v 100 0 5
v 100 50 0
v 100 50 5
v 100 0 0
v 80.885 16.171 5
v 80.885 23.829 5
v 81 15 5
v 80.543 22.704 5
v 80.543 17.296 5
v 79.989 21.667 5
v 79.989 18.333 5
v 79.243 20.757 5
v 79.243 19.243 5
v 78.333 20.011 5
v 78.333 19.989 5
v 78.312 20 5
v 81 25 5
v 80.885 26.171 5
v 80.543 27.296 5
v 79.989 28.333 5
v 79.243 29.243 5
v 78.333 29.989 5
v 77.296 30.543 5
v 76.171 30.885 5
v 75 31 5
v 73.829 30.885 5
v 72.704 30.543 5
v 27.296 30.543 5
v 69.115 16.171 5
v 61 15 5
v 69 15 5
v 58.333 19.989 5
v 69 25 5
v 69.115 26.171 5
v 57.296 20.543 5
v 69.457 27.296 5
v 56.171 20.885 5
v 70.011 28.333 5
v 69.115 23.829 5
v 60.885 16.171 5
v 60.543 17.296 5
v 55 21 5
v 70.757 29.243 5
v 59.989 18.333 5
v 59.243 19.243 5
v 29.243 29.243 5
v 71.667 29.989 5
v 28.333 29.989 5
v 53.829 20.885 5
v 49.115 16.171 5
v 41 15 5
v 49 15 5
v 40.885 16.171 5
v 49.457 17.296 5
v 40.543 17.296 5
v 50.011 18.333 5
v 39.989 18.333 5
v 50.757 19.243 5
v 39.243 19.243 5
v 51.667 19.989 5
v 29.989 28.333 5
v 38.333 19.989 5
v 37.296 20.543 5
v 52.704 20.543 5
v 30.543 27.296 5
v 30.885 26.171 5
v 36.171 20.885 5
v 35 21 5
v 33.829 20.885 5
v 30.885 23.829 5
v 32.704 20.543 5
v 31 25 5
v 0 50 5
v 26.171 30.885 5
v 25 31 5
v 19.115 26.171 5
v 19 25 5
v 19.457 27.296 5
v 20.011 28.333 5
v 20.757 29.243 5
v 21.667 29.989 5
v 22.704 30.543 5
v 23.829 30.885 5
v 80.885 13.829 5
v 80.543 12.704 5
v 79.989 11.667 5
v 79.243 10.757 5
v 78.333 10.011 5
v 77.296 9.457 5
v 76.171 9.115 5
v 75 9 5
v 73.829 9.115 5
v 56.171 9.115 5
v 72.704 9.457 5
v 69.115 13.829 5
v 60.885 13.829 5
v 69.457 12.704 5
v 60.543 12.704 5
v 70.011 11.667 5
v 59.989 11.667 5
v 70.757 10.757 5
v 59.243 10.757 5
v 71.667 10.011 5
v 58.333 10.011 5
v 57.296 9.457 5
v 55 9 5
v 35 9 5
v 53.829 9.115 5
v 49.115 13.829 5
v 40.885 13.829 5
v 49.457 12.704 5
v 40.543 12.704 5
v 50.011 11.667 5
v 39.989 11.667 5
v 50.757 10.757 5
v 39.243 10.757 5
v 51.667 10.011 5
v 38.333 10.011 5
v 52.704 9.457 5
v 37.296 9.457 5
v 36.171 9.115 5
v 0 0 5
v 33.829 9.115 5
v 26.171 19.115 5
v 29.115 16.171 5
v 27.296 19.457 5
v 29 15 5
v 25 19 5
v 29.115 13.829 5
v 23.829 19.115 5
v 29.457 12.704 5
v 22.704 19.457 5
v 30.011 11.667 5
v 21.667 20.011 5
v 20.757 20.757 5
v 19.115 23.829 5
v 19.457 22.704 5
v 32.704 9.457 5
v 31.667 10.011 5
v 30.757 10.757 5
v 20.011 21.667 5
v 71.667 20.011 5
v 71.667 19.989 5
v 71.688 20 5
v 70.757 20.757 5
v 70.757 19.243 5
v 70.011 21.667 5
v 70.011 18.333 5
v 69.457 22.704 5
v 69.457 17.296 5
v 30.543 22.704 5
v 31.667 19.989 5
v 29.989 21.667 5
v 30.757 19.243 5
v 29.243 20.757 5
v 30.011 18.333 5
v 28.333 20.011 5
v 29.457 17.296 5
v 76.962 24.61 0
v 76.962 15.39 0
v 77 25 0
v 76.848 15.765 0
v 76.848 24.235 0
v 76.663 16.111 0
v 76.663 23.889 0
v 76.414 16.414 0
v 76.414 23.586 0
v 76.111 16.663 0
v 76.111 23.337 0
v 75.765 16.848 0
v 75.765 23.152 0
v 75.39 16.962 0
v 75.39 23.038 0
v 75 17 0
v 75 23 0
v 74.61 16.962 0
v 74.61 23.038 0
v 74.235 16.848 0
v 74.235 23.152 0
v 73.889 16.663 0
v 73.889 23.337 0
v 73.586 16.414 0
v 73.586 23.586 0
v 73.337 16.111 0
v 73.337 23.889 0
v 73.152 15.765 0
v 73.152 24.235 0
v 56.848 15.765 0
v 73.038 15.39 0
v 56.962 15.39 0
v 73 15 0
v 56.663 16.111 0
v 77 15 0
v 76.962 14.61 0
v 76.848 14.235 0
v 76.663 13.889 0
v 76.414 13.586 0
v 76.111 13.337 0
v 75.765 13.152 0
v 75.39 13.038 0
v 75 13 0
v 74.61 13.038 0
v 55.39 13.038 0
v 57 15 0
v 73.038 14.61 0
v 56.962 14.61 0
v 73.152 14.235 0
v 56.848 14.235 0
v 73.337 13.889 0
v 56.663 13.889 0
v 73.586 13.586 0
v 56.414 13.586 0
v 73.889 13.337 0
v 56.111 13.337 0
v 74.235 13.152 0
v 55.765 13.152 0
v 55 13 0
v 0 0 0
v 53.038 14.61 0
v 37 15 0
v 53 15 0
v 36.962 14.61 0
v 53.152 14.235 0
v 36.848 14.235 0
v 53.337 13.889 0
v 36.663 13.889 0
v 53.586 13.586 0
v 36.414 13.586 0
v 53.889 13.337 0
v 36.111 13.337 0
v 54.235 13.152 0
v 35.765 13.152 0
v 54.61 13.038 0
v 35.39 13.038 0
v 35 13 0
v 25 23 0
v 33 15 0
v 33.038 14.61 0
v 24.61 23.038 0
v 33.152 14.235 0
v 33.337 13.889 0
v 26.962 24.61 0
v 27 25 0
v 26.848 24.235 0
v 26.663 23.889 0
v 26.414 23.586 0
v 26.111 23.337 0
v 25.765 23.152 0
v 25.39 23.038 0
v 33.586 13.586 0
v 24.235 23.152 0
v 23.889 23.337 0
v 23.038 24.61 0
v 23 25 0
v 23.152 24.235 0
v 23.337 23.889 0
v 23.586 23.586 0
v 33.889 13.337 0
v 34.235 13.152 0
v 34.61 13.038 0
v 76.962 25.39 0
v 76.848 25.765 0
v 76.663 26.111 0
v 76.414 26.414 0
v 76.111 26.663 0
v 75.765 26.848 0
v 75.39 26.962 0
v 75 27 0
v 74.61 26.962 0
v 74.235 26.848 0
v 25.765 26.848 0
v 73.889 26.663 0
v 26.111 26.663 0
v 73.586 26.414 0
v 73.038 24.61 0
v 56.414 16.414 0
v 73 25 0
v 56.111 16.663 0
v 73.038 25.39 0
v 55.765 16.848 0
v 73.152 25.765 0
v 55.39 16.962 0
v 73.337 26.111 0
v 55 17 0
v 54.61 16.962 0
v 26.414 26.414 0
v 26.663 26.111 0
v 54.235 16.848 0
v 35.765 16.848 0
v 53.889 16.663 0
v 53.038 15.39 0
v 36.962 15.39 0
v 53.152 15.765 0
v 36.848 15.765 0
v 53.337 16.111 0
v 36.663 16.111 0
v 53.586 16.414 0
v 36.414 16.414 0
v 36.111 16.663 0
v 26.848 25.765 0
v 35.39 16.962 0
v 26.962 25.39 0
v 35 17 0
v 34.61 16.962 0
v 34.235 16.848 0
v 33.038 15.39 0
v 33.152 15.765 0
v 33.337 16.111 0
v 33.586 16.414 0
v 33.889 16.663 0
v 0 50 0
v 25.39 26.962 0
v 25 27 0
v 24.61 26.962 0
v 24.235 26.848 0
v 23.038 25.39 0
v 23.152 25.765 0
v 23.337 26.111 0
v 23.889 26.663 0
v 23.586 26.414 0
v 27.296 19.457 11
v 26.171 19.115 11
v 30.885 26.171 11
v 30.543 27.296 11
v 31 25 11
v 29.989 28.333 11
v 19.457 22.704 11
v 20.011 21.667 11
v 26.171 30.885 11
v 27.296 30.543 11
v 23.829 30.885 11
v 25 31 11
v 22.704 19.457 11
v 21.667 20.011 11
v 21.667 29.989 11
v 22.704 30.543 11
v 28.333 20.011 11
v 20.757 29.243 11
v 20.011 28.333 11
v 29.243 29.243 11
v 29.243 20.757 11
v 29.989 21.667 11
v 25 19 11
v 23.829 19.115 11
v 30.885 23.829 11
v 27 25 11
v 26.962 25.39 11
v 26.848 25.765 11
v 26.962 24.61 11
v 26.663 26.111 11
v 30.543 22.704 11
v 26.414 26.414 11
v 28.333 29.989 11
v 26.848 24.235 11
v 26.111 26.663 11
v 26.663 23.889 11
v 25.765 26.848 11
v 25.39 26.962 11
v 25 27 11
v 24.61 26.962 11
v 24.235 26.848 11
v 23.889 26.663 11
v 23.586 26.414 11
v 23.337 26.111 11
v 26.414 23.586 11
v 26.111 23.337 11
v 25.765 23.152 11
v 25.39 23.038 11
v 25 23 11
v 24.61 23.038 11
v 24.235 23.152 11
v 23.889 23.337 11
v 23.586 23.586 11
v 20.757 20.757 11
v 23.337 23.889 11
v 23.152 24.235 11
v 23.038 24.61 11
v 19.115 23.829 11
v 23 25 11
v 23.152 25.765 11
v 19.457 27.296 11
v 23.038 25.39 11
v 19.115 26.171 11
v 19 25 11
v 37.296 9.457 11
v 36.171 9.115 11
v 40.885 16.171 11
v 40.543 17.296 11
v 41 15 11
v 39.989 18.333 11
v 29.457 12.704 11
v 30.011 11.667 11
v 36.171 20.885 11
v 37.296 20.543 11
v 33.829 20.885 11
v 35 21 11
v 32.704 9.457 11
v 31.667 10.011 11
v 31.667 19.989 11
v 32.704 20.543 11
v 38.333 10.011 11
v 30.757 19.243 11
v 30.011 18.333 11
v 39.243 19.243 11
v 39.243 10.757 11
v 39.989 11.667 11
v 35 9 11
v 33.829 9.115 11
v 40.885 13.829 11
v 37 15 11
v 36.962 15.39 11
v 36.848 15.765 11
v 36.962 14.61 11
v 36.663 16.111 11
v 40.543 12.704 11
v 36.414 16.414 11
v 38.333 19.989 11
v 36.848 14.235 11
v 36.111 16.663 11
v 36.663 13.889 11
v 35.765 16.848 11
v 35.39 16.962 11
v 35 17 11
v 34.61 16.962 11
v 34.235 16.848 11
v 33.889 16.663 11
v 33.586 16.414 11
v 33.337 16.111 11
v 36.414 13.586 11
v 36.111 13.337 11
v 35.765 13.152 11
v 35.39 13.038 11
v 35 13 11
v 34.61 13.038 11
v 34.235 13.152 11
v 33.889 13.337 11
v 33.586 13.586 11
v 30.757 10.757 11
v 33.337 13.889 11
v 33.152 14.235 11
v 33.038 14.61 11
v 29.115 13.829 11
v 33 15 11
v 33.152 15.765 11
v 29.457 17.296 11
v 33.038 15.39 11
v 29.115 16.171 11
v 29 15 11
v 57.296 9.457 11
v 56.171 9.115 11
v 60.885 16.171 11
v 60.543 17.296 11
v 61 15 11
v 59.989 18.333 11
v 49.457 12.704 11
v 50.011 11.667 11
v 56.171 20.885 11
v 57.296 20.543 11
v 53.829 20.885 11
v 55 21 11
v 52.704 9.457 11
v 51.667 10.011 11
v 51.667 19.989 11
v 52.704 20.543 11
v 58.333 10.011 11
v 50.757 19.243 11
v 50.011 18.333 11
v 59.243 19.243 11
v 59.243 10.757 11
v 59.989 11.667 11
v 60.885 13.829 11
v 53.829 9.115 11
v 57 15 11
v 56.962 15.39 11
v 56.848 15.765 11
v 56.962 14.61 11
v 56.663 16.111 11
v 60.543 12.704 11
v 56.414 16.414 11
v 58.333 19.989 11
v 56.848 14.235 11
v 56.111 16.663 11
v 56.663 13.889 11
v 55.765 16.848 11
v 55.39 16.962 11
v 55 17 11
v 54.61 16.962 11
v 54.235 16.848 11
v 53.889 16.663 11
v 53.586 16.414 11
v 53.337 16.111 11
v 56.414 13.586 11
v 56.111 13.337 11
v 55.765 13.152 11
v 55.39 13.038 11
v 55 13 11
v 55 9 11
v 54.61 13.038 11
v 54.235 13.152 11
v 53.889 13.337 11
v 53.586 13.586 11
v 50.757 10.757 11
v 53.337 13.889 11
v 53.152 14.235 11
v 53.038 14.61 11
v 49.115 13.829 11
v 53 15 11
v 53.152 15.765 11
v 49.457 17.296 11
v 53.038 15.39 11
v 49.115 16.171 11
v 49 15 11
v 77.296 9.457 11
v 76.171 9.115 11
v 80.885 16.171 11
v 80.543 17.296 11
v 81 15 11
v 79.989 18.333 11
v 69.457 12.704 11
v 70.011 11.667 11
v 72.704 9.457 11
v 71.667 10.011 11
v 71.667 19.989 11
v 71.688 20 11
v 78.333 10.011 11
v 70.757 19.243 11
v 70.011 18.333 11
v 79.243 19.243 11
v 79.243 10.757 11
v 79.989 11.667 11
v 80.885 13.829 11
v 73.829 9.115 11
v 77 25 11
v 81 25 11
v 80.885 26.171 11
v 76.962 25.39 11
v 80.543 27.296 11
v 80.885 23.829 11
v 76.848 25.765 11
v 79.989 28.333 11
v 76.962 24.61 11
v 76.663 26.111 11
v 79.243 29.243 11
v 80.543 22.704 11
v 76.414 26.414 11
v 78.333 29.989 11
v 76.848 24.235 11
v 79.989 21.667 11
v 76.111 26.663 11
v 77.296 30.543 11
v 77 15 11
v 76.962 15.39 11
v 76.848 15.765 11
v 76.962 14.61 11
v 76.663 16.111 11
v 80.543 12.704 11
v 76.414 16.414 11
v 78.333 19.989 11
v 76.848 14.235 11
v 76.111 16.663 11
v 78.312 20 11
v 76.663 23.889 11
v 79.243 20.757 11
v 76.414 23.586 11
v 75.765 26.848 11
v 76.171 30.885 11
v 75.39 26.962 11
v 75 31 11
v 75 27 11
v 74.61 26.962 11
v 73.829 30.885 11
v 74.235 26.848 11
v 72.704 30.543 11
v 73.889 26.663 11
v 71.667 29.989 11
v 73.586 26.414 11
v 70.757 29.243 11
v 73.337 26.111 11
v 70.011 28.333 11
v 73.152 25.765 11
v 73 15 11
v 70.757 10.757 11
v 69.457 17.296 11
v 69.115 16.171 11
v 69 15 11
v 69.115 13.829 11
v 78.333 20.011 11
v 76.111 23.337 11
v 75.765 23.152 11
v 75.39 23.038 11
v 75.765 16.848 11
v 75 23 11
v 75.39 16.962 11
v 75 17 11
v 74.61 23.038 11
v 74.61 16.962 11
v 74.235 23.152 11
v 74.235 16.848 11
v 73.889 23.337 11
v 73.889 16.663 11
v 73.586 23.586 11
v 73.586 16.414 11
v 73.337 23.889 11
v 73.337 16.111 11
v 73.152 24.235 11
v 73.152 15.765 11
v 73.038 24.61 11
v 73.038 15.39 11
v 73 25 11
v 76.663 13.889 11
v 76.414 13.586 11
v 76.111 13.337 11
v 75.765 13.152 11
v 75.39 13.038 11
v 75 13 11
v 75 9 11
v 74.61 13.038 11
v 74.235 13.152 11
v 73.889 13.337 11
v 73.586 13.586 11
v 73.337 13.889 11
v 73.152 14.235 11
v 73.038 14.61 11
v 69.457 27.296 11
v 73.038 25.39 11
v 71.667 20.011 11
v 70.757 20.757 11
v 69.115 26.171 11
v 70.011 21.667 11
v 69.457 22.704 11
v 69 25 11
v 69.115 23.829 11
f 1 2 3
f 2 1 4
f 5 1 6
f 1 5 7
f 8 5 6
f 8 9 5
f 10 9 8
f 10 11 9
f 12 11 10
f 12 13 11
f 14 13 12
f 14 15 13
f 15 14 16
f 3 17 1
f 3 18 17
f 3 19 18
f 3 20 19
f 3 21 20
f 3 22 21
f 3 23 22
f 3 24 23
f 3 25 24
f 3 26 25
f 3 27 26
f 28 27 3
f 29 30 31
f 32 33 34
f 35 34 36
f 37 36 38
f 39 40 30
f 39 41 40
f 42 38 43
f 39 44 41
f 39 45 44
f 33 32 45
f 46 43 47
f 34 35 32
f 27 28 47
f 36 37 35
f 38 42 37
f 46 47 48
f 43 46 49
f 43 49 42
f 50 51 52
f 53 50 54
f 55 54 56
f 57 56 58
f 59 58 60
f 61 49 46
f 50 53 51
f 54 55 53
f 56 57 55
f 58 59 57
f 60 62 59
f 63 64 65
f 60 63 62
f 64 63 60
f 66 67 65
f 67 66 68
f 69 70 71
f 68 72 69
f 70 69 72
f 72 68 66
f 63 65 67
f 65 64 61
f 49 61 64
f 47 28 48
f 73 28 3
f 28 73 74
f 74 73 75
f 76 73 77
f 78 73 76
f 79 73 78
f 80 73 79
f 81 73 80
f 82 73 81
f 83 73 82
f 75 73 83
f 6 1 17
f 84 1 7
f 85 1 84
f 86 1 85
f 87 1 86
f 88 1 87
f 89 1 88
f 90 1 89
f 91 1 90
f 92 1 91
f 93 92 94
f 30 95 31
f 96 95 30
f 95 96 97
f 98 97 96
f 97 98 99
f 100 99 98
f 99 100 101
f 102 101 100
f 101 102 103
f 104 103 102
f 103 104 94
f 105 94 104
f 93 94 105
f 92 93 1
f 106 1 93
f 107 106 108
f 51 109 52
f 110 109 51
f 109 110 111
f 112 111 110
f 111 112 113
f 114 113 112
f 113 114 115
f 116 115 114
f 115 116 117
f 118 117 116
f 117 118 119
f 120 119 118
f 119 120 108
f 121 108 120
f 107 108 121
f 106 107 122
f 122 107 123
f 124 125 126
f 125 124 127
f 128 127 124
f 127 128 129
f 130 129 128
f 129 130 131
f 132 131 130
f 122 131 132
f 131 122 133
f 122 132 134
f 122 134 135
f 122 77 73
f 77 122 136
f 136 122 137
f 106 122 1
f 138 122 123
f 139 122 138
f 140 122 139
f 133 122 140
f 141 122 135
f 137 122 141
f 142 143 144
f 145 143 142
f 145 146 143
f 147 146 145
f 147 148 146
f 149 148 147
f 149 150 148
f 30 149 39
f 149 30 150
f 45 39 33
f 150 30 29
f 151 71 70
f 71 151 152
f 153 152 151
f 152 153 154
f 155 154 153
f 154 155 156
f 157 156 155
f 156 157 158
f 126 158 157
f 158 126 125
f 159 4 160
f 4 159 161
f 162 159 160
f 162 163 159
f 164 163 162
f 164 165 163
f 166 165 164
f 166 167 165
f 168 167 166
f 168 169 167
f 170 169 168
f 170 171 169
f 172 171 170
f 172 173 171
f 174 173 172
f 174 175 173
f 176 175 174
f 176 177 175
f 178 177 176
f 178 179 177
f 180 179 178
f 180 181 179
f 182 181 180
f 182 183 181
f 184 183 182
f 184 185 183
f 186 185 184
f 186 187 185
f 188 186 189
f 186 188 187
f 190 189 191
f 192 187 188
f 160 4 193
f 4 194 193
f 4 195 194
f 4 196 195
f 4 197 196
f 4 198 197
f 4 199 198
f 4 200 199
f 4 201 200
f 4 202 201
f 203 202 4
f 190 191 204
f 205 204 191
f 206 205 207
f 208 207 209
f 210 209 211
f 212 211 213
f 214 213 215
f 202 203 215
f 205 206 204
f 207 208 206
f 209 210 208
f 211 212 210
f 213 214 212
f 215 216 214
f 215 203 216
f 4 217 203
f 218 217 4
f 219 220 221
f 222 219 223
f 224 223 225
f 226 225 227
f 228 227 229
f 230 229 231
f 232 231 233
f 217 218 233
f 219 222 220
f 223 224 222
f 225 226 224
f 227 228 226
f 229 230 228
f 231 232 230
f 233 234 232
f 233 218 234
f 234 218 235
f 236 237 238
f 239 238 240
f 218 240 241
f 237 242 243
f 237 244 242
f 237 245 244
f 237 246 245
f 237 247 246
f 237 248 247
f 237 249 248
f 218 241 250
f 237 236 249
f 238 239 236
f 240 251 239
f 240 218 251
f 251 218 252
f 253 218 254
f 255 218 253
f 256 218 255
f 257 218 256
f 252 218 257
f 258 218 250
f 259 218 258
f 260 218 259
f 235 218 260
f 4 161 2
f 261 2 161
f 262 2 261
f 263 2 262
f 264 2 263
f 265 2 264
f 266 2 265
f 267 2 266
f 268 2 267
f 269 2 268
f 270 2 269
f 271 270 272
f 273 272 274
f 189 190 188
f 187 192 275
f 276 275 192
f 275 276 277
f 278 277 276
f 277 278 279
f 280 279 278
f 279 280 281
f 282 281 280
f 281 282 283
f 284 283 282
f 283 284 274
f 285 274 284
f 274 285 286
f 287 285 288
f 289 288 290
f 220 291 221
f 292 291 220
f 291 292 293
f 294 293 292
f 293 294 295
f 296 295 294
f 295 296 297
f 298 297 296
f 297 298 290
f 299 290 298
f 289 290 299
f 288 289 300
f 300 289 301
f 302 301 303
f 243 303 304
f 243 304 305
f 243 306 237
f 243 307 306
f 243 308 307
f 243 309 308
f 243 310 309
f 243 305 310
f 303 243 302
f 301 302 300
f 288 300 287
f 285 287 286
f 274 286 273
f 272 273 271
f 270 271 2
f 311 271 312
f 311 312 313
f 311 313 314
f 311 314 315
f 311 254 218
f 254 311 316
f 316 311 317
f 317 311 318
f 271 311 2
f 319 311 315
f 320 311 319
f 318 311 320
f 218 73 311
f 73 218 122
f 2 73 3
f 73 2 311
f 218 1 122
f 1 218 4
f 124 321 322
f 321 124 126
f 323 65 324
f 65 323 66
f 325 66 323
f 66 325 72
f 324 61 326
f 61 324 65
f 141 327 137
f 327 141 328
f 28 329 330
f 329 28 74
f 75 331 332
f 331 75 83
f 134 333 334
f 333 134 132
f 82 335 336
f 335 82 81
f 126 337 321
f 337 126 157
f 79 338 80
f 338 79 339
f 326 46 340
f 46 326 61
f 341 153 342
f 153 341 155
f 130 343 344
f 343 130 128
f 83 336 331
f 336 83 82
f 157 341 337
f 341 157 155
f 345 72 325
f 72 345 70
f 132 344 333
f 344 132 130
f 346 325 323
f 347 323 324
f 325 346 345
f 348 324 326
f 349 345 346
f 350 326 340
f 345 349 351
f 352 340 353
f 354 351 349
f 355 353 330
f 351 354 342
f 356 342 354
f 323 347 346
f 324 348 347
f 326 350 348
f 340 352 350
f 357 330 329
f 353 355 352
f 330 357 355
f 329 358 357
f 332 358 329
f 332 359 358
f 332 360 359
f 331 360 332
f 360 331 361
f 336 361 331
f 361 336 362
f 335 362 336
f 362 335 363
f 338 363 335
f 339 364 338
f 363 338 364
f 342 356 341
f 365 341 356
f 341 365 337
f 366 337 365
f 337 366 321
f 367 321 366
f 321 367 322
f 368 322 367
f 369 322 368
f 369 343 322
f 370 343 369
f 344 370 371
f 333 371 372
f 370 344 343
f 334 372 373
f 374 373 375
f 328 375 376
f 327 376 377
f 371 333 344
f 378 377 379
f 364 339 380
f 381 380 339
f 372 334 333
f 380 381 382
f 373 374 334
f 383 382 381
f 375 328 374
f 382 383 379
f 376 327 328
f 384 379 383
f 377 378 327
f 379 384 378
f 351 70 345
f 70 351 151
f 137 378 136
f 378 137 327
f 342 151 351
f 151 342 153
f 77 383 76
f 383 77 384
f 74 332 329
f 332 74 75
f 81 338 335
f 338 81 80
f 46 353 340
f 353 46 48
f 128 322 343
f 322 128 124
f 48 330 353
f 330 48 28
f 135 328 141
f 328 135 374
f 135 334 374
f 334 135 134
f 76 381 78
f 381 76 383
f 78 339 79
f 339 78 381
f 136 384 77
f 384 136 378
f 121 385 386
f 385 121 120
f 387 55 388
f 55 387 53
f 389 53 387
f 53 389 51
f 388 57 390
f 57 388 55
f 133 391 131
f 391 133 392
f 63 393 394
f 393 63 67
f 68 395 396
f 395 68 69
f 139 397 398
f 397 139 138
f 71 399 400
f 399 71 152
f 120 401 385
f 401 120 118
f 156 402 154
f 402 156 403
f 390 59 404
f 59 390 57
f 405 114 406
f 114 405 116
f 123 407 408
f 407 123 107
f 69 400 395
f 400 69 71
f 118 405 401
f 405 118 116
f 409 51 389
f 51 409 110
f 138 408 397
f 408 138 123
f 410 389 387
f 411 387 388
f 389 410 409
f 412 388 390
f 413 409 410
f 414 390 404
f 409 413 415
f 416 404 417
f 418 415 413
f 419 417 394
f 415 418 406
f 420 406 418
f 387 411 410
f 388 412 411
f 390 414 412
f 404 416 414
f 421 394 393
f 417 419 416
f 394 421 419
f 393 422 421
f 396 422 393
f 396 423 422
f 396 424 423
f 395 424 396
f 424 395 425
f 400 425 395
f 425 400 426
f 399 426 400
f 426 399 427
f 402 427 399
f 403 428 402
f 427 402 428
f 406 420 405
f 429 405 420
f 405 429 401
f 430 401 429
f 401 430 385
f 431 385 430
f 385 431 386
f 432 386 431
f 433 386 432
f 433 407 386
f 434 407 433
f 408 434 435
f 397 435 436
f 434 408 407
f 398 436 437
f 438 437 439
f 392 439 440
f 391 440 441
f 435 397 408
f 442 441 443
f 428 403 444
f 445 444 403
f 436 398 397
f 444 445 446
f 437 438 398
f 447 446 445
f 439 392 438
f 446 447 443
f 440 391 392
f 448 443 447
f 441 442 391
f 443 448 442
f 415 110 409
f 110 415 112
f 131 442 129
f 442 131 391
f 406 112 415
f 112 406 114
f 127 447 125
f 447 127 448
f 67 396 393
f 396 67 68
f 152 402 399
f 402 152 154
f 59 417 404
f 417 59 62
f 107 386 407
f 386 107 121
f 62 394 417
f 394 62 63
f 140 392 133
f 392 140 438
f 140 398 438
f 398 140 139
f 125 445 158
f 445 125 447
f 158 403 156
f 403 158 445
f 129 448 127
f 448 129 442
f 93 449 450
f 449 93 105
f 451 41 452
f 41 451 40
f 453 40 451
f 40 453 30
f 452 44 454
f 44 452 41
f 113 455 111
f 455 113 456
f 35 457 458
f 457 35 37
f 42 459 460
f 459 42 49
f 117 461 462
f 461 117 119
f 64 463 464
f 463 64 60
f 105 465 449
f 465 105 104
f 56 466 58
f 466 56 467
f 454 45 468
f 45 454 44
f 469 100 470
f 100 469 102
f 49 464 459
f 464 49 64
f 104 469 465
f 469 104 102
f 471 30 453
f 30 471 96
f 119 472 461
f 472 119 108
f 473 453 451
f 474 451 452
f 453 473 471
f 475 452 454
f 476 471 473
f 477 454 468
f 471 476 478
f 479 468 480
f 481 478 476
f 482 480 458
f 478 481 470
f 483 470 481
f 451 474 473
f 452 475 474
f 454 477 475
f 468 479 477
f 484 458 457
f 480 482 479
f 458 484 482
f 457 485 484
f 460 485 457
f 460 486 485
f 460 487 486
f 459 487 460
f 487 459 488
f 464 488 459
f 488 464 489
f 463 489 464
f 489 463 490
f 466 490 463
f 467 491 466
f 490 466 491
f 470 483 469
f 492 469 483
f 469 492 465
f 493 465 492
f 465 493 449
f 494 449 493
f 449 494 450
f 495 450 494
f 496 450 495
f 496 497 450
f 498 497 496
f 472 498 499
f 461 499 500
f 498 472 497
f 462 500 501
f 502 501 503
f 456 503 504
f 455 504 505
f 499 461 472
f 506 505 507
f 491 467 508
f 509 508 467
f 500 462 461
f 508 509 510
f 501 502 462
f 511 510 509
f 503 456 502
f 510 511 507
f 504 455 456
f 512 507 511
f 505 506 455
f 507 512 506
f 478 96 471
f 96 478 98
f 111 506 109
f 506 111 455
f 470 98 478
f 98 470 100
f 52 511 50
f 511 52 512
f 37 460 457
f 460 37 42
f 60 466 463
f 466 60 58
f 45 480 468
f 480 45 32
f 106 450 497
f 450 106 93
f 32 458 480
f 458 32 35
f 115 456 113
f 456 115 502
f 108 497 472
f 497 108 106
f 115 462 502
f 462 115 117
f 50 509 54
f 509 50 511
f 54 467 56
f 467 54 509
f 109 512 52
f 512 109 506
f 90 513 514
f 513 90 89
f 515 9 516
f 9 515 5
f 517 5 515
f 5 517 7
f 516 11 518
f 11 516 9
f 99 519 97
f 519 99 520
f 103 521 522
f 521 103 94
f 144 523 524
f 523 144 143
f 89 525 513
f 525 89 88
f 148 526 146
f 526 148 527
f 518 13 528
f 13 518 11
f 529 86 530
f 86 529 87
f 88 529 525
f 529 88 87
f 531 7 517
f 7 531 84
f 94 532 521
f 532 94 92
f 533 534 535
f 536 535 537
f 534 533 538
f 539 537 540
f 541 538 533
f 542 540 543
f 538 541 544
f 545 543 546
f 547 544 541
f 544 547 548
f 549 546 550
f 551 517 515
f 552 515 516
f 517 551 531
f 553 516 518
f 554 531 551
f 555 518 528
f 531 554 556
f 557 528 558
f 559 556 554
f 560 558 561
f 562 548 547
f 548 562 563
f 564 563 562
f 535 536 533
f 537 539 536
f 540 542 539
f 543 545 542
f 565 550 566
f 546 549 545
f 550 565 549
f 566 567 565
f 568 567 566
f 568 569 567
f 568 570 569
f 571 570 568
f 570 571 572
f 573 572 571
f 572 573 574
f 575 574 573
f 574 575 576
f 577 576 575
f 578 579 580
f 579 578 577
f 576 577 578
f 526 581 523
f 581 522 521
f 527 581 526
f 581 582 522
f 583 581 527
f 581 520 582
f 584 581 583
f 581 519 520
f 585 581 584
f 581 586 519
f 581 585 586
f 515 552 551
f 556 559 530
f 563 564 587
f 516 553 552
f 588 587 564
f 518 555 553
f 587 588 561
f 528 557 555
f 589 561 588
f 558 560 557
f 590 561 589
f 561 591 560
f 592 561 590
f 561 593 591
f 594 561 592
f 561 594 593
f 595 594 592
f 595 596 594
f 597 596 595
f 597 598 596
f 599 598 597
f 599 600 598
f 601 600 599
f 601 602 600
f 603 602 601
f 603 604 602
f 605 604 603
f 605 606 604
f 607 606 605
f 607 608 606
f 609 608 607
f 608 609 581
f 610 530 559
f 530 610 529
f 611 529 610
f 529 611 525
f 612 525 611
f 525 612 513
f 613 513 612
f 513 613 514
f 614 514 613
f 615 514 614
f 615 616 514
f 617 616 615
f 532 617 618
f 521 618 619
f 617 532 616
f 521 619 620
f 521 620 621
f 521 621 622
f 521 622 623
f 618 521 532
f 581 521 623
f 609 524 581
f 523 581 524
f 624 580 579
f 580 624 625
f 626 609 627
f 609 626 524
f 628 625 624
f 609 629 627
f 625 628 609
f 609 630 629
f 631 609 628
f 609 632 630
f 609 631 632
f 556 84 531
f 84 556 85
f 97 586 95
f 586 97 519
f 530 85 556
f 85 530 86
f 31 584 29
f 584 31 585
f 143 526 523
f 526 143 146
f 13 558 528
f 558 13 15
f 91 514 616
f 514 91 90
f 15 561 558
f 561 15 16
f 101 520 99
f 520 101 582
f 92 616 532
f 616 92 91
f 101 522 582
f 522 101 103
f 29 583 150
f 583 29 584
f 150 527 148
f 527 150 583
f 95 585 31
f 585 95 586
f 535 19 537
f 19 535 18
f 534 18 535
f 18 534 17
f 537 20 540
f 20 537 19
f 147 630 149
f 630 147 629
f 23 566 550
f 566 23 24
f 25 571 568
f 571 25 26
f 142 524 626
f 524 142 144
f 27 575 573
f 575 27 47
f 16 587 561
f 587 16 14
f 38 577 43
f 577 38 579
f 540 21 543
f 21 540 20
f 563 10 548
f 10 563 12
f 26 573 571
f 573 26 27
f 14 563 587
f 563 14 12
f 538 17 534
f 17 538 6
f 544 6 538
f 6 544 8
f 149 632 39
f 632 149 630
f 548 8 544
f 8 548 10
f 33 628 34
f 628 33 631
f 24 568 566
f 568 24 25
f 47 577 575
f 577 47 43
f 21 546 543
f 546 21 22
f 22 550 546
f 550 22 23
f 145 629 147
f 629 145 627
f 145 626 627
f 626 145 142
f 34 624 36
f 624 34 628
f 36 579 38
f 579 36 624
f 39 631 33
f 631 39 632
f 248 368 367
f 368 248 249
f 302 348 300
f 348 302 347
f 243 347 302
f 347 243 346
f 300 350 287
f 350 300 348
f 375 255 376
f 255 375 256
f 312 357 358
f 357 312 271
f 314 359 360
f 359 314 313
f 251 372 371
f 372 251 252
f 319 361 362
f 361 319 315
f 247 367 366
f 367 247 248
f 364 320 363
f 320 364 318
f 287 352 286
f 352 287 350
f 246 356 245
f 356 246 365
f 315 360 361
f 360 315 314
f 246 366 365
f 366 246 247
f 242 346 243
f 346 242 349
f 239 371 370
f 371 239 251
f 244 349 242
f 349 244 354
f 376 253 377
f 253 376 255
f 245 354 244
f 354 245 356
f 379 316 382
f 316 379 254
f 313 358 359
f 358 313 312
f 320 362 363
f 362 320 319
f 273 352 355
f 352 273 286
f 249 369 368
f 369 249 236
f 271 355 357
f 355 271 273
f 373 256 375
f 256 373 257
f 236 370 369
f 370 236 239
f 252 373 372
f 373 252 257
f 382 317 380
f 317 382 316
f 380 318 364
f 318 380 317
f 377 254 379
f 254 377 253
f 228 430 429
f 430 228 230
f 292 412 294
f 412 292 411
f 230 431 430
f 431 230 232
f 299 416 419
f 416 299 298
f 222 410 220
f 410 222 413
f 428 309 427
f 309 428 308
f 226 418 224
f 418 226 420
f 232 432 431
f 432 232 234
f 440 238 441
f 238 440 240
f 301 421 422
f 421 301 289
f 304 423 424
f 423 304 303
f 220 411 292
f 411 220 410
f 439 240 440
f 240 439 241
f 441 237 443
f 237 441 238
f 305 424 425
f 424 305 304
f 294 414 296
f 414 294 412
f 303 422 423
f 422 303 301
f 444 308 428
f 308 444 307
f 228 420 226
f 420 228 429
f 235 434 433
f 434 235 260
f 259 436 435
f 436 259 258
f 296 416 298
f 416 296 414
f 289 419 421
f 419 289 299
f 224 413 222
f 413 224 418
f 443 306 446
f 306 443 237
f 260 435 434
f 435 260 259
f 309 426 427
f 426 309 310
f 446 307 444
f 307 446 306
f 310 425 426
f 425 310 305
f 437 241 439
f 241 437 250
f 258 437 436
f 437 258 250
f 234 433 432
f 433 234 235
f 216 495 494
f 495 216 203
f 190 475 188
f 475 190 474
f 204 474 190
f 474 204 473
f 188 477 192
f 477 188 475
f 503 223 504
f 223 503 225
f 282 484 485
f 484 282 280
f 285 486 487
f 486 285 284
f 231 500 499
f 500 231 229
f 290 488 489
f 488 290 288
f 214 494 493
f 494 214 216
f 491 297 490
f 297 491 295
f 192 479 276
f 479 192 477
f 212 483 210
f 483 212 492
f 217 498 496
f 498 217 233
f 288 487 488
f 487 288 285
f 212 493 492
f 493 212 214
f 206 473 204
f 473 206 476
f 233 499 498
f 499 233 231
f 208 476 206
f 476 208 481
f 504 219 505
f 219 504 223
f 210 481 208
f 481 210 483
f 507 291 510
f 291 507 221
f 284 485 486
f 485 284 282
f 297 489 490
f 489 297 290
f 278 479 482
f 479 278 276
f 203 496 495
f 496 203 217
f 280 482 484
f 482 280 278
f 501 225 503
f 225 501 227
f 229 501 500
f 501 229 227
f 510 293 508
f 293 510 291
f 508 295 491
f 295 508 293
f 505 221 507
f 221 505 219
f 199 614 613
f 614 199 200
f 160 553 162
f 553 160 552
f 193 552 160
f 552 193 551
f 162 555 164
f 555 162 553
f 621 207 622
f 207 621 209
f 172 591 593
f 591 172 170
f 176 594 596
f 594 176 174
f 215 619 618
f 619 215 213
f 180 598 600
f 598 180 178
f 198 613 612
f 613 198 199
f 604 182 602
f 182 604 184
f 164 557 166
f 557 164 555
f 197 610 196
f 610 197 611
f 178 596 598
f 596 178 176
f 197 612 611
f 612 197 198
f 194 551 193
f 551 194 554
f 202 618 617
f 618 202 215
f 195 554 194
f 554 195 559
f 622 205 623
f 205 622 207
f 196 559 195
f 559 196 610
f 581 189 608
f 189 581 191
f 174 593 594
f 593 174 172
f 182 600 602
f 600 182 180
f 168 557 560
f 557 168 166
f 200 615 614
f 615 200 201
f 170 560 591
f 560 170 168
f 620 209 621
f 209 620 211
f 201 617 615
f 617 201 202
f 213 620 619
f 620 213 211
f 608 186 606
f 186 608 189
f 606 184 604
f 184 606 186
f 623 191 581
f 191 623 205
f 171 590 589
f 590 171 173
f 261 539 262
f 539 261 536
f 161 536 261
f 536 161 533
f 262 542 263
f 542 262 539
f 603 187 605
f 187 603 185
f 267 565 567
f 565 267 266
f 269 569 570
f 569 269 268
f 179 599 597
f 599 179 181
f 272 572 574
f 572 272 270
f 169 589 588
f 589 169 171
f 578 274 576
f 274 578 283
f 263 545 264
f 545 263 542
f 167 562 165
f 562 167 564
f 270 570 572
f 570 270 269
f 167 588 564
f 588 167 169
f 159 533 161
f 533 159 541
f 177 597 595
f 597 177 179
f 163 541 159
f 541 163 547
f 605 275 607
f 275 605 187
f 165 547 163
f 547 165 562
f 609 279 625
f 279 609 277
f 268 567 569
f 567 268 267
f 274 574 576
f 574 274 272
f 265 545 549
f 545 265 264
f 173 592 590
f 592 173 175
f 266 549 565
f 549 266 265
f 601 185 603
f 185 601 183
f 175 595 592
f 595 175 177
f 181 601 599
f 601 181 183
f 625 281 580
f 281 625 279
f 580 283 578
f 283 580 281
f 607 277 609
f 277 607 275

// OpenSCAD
$fn = 32;

// ----------------------------------------------------------------------
// Boss field: plate with bosses at given coordinates
// ----------------------------------------------------------------------

// --- parameters (mm) ---
plate_l = 100;            // plate length, X
plate_w = 50;             // plate width, Y
plate_t = 5;              // plate thickness, Z
boss_d = 12;              // boss diameter
boss_h = 6;               // boss height above the plate
bore_d = 4;               // boss bore
fit_tol = 0.05;           // tolerance for press fits, mm
free_tol = 0.3;           // tolerance for clearance fits, mm

total_h = plate_t + boss_h;  // overall height

difference() {
  union() {
    cube([plate_l, plate_w, plate_t]);
    translate([25, 25, plate_t]) cylinder(h = boss_h, d = boss_d);
    translate([35, 15, plate_t]) cylinder(h = boss_h, d = boss_d);
    translate([55, 15, plate_t]) cylinder(h = boss_h, d = boss_d);
    translate([75, 15, plate_t]) cylinder(h = boss_h, d = boss_d);
    translate([75, 25, plate_t]) cylinder(h = boss_h, d = boss_d);
  }
  translate([25, 25, -1]) cylinder(h = total_h + 2, d = bore_d);
  translate([35, 15, -1]) cylinder(h = total_h + 2, d = bore_d);
  translate([55, 15, -1]) cylinder(h = total_h + 2, d = bore_d);
  translate([75, 15, -1]) cylinder(h = total_h + 2, d = bore_d);
  translate([75, 25, -1]) cylinder(h = total_h + 2, d = bore_d);
}
